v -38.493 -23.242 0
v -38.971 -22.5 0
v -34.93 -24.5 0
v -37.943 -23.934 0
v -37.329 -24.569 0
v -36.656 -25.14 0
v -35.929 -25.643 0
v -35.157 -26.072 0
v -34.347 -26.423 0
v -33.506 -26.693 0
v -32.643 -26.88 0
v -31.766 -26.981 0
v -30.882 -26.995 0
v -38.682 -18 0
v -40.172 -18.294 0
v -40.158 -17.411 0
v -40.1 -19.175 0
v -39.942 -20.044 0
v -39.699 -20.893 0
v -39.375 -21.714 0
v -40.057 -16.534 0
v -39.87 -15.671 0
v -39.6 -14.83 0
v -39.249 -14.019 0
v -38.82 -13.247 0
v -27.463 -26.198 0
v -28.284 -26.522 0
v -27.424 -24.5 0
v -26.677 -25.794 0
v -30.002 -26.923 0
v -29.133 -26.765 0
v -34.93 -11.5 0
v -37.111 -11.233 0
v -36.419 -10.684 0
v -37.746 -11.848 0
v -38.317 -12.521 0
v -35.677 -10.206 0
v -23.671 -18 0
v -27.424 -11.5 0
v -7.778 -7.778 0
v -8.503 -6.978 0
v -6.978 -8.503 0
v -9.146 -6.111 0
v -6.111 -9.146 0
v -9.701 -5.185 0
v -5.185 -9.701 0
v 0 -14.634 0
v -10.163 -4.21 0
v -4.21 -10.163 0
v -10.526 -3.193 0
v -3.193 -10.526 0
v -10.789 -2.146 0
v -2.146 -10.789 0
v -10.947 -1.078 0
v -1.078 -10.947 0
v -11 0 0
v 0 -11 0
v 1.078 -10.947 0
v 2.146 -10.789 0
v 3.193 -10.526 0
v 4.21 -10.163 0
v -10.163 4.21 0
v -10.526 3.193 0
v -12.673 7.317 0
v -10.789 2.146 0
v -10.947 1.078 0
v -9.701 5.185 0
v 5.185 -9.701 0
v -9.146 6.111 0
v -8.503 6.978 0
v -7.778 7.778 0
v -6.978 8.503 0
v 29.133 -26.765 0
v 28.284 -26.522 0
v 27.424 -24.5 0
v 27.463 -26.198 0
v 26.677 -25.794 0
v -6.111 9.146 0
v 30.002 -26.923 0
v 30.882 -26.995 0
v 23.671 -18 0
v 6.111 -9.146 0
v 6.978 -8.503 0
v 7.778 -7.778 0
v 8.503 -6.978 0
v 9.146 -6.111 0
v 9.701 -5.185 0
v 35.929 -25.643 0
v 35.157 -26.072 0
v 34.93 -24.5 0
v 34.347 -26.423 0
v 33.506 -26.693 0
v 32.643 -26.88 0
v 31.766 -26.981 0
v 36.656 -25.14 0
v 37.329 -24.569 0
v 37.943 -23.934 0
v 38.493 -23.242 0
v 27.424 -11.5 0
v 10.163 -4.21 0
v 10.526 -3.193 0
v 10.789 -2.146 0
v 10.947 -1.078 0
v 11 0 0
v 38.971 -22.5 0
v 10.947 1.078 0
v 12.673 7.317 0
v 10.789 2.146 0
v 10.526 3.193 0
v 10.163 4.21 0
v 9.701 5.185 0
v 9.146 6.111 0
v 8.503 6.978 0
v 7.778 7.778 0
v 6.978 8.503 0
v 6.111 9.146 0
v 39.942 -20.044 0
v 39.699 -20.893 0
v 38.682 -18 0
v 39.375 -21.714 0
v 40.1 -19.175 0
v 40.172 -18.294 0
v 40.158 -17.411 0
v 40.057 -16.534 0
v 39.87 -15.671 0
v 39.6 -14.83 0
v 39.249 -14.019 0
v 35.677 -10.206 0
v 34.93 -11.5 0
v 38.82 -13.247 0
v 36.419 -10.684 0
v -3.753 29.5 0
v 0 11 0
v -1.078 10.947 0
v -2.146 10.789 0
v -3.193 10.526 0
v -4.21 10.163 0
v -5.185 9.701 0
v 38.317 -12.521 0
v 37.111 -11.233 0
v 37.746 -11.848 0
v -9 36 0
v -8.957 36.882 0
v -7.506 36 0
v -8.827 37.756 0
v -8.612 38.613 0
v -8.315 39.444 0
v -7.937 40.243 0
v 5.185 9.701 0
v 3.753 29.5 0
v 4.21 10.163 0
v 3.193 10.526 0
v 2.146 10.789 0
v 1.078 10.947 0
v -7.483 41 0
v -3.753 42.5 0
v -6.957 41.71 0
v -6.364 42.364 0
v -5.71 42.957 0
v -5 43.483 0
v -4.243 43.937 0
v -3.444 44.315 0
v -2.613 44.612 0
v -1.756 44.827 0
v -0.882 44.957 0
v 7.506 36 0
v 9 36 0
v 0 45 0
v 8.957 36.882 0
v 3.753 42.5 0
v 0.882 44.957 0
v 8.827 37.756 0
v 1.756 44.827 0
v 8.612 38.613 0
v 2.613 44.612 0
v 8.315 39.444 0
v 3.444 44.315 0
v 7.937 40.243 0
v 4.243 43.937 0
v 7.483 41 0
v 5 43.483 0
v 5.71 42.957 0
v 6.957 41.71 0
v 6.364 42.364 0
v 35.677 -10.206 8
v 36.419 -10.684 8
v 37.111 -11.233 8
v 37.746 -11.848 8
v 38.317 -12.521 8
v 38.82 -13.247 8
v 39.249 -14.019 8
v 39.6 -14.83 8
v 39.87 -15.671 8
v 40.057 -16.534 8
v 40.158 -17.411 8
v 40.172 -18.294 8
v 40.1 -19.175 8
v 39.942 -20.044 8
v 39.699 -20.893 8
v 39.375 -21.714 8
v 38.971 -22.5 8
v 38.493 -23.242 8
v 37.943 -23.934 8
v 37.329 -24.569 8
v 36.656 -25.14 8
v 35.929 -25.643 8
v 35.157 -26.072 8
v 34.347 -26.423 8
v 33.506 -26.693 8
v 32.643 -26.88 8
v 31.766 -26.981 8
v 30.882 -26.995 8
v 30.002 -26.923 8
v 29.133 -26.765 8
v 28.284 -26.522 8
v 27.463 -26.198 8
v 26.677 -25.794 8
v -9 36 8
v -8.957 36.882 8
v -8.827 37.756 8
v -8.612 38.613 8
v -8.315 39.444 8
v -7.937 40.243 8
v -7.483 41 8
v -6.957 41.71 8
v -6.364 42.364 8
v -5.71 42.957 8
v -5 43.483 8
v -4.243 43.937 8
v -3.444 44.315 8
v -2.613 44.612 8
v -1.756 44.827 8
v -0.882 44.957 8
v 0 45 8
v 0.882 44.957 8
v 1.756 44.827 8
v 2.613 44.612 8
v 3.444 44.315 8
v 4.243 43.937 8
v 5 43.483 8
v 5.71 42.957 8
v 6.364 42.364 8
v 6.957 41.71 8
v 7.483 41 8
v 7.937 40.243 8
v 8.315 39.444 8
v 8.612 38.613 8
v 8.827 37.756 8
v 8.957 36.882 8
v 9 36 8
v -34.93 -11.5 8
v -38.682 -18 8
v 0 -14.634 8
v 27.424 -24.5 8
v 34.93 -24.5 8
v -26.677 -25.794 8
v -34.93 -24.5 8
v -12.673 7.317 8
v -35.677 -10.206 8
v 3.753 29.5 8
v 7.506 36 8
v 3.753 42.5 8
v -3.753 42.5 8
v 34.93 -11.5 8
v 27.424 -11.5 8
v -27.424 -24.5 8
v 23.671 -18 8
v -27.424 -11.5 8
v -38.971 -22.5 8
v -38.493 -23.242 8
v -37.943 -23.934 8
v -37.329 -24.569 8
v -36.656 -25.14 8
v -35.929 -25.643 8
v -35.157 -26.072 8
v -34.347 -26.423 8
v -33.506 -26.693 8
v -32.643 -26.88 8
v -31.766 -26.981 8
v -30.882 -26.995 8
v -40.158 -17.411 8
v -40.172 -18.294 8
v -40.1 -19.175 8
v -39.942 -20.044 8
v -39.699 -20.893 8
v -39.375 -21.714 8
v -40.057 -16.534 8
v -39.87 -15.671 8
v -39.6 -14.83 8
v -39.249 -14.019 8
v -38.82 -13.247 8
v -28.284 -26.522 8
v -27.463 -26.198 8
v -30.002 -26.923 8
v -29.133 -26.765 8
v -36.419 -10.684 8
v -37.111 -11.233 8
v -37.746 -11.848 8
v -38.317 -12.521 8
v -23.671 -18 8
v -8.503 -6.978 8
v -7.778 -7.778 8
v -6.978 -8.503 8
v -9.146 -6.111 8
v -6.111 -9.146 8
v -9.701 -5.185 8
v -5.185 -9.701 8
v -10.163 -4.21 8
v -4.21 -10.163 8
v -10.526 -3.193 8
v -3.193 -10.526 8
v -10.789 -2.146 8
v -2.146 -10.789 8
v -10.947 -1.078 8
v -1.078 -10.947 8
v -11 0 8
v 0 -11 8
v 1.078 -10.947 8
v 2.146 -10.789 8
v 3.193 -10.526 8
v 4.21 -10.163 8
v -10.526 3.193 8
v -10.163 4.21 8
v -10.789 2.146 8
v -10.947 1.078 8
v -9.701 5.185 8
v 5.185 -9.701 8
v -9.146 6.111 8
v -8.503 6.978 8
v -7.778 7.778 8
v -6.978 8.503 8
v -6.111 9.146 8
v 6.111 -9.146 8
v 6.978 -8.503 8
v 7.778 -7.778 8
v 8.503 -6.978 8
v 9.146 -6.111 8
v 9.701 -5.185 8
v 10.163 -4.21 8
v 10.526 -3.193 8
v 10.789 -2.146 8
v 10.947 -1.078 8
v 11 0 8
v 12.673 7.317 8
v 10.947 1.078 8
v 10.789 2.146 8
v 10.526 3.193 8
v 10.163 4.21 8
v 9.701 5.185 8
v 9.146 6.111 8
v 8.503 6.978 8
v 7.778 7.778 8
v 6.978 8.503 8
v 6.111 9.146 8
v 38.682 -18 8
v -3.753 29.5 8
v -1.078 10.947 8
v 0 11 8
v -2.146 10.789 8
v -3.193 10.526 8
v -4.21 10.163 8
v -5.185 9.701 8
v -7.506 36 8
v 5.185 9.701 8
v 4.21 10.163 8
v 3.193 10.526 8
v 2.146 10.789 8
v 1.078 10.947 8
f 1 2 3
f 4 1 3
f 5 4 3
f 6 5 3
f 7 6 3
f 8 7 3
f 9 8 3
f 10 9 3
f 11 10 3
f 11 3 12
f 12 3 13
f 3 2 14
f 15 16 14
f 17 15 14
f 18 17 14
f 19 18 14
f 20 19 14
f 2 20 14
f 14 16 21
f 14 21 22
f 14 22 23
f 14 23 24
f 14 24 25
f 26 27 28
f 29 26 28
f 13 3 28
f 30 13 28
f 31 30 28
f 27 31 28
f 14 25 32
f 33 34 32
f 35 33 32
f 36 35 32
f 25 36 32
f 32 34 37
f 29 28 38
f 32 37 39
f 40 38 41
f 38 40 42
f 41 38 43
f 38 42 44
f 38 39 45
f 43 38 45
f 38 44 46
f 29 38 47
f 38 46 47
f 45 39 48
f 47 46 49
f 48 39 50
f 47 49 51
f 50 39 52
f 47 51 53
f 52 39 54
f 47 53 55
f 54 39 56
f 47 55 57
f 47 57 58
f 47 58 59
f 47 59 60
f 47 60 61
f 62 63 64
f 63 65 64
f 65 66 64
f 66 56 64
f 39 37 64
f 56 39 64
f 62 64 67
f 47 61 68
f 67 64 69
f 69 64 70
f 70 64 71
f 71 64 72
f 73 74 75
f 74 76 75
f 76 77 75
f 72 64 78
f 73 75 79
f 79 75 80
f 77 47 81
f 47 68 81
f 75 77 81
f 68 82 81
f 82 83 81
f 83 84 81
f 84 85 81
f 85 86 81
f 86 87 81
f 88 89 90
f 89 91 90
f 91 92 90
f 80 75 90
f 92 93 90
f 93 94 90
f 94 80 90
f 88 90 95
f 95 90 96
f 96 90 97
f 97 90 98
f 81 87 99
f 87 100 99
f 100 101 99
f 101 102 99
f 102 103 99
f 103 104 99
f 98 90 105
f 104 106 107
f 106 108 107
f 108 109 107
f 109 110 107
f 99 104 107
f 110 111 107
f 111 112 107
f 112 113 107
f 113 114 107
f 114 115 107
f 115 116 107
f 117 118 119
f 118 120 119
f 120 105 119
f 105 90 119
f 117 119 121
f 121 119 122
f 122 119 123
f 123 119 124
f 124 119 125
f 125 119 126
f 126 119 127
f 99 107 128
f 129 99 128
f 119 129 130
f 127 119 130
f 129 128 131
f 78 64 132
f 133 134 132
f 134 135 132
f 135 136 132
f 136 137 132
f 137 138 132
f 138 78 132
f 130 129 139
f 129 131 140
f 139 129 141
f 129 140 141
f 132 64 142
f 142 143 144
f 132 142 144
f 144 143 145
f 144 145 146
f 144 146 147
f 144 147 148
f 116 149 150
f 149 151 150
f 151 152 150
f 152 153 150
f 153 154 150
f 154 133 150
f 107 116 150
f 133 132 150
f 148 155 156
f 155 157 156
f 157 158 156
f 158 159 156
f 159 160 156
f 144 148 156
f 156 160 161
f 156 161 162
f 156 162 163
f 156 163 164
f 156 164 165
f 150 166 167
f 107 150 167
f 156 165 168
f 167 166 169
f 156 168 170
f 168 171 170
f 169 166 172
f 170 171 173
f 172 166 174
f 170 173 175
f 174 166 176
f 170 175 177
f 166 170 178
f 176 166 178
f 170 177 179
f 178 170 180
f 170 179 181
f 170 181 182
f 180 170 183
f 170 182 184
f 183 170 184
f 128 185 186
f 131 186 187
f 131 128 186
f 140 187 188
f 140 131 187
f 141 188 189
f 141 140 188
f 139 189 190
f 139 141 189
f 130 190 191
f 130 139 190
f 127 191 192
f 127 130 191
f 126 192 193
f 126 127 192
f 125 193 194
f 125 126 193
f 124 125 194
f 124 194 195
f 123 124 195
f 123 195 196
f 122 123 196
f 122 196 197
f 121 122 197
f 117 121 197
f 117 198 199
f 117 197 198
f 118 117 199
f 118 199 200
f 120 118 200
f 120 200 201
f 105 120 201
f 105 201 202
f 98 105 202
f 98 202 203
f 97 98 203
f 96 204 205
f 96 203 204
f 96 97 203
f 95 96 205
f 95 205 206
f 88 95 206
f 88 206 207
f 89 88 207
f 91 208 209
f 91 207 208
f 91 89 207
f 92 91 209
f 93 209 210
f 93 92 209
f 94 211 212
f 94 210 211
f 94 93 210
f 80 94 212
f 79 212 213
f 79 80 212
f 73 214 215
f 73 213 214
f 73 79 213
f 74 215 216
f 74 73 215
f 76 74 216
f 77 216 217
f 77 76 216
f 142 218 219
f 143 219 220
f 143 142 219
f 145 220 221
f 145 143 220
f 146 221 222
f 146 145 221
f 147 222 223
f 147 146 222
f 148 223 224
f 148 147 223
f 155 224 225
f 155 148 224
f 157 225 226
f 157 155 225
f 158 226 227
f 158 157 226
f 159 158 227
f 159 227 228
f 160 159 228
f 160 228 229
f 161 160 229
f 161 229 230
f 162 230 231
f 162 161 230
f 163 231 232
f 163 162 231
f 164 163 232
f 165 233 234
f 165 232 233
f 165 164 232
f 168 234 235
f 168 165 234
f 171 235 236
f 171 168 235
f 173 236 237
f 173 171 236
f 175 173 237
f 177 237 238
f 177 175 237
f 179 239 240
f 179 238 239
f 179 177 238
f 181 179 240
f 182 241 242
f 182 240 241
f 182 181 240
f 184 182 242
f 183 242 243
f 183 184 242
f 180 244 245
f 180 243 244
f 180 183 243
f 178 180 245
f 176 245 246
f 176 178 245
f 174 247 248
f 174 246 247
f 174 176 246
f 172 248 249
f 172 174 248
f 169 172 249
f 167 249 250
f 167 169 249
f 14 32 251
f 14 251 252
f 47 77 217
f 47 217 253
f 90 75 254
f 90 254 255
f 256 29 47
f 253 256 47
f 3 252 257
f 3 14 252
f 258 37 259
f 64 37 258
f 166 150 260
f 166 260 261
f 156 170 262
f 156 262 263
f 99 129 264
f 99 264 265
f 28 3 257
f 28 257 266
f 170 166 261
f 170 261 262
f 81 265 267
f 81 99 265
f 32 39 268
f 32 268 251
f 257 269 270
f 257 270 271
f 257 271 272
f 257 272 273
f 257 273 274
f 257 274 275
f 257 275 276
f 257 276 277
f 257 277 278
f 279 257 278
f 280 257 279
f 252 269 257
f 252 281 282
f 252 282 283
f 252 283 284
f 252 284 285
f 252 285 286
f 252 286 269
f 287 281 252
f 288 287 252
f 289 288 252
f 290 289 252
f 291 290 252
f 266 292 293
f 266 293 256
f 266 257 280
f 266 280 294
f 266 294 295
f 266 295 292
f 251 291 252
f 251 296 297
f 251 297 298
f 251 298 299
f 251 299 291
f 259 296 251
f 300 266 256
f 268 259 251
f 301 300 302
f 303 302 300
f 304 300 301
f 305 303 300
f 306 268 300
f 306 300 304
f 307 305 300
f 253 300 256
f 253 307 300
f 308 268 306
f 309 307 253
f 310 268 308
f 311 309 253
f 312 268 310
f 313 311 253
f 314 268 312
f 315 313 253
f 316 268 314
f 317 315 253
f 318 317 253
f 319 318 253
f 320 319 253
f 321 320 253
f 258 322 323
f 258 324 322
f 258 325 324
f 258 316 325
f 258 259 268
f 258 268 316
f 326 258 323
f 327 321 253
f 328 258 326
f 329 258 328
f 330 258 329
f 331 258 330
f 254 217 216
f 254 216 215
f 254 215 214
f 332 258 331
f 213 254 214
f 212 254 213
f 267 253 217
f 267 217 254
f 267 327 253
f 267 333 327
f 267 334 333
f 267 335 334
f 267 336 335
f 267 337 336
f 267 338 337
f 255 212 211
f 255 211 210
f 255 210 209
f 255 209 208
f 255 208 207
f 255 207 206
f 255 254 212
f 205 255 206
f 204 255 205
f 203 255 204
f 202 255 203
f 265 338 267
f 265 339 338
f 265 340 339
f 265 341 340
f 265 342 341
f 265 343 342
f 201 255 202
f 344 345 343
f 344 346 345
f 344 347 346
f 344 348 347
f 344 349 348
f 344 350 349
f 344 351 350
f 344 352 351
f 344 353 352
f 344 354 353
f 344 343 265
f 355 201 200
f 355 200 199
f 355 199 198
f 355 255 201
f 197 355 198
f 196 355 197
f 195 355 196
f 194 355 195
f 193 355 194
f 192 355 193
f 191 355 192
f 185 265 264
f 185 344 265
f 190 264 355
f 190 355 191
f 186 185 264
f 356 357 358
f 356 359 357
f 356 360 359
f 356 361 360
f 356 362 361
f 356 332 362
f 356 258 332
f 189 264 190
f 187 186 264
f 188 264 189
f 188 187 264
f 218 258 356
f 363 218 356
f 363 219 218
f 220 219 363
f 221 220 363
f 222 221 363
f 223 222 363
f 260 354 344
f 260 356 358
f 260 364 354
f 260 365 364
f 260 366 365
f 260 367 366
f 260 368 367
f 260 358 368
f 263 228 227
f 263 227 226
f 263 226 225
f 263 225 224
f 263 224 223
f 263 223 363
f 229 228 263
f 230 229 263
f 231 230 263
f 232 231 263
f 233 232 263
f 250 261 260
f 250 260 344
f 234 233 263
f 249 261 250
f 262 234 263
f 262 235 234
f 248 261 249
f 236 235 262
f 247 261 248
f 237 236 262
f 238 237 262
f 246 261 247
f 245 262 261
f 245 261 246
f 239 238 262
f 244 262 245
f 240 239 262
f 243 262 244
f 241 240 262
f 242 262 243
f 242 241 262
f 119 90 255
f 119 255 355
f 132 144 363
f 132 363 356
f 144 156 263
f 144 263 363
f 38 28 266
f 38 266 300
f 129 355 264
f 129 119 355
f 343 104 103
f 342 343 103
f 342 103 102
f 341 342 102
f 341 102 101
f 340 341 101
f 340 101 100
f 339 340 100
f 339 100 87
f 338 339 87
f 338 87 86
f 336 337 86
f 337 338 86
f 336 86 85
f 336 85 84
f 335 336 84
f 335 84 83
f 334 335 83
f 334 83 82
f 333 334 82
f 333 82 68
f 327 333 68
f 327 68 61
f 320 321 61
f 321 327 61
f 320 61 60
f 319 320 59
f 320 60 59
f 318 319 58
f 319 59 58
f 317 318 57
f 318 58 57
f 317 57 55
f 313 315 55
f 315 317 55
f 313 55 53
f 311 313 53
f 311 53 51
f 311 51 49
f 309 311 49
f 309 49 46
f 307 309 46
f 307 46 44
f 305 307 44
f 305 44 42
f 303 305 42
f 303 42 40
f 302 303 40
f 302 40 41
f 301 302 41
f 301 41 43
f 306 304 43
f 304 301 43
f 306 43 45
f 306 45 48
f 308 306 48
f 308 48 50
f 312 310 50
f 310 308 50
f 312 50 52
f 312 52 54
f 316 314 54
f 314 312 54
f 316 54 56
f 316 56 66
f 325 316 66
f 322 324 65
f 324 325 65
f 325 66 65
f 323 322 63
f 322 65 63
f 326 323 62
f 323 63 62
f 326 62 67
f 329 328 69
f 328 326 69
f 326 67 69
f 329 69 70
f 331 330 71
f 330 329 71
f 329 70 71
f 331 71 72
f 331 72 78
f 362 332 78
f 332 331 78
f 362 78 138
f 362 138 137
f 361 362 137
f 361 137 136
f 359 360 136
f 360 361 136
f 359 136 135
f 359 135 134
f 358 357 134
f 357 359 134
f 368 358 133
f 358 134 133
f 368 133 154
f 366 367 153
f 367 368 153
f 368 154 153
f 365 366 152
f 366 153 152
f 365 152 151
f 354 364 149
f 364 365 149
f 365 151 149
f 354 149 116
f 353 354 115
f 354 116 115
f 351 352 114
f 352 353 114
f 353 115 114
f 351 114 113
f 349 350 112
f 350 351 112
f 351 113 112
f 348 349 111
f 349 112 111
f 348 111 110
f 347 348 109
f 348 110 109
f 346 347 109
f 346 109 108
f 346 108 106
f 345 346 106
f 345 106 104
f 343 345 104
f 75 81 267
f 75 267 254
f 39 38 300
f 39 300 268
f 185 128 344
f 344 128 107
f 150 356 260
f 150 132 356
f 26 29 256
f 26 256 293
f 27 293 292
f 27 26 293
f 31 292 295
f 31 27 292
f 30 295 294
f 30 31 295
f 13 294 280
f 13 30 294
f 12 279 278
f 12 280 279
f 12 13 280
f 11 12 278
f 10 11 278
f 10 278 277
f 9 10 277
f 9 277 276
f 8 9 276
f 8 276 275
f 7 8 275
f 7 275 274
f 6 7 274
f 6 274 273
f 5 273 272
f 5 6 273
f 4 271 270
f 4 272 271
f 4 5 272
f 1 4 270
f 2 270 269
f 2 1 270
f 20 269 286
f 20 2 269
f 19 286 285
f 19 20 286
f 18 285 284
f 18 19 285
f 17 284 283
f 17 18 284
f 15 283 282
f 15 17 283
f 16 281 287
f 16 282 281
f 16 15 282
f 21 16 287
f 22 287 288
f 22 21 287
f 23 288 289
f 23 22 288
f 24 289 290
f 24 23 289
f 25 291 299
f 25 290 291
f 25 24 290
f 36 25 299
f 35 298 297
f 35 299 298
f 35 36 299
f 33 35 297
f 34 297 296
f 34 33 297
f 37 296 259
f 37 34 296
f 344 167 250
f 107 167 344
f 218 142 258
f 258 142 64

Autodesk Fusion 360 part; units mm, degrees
sketch "Sketch1" plane through (0, 0, 0) normal (0, 0, 1) x (1, 0, 0)
  circle A0 centre (0, 0) radius 4
  circle A1 centre (0, 0) radius 11
  circle A2 centre (0, 0) radius 13.5
  circle A3 centre (0, 36) radius 9
  line L0 (0, 0) -> (0, 45)
  line L1 (-3.7528, 42.5) -> (-7.5056, 36)
  line L2 (-7.5056, 36) -> (-3.7528, 29.5)
  line L3 (-3.7528, 29.5) -> (3.7528, 29.5)
  line L4 (3.7528, 29.5) -> (7.5056, 36)
  line L5 (7.5056, 36) -> (3.7528, 42.5)
  line L6 (3.7528, 42.5) -> (-3.7528, 42.5)
  line L7 (9, 36) -> (13.3906, 1.7148)
  line L8 (-9, 36) -> (-13.3906, 1.7148)
  line L9 (-26.6769, -25.7942) -> (5.2102, -12.4541)
  circle A4 centre (-31.1769, -18) radius 9
  line L10 (-27.4241, -24.5) -> (-23.6714, -18)
  line L11 (-34.9297, -24.5) -> (-27.4241, -24.5)
  line L12 (-38.6825, -18) -> (-34.9297, -24.5)
  line L13 (-27.4241, -11.5) -> (-34.9297, -11.5)
  line L14 (-23.6714, -18) -> (-27.4241, -11.5)
  line L15 (-34.9297, -11.5) -> (-38.6825, -18)
  line L16 (-35.6769, -10.2058) -> (-8.1804, 10.7392)
  line L17 (35.6769, -10.2058) -> (8.1804, 10.7392)
  circle A5 centre (31.1769, -18) radius 9
  line L18 (34.9297, -11.5) -> (27.4241, -11.5)
  line L19 (38.6825, -18) -> (34.9297, -11.5)
  line L20 (34.9297, -24.5) -> (38.6825, -18)
  line L21 (23.6714, -18) -> (27.4241, -24.5)
  line L22 (27.4241, -11.5) -> (23.6714, -18)
  line L23 (27.4241, -24.5) -> (34.9297, -24.5)
  line L24 (26.6769, -25.7942) -> (-5.2102, -12.4541)
  point P0 (0, 36)
  point P1 (0, 36)
  point P2 (0, 36)
  point P3 (0, 36)
  point P4 (0, 36)
  dimension "d1" = 8
  dimension "d2" = 22
  dimension "d3" = 27
  dimension "d10" = 18
  dimension "d12" = 6.5
  dimension "d14" = 360
extrude "Extrude1" add sketch "Sketch1" along normal blind 8 contours A2 | A2 A3 L0 L8 L16 | A2 A3 L0 L7 L17 | A2 L7 L17 | A2 L8 L16 | A3 L0 L3 L4 L5 L6 | A3 L0 L1 L2 L3 L6 | A2 L7 L9 L17 A5 L24 | A2 L8 L9 A4 L16 L24 | A5 | A2 L9 L24 | A4
